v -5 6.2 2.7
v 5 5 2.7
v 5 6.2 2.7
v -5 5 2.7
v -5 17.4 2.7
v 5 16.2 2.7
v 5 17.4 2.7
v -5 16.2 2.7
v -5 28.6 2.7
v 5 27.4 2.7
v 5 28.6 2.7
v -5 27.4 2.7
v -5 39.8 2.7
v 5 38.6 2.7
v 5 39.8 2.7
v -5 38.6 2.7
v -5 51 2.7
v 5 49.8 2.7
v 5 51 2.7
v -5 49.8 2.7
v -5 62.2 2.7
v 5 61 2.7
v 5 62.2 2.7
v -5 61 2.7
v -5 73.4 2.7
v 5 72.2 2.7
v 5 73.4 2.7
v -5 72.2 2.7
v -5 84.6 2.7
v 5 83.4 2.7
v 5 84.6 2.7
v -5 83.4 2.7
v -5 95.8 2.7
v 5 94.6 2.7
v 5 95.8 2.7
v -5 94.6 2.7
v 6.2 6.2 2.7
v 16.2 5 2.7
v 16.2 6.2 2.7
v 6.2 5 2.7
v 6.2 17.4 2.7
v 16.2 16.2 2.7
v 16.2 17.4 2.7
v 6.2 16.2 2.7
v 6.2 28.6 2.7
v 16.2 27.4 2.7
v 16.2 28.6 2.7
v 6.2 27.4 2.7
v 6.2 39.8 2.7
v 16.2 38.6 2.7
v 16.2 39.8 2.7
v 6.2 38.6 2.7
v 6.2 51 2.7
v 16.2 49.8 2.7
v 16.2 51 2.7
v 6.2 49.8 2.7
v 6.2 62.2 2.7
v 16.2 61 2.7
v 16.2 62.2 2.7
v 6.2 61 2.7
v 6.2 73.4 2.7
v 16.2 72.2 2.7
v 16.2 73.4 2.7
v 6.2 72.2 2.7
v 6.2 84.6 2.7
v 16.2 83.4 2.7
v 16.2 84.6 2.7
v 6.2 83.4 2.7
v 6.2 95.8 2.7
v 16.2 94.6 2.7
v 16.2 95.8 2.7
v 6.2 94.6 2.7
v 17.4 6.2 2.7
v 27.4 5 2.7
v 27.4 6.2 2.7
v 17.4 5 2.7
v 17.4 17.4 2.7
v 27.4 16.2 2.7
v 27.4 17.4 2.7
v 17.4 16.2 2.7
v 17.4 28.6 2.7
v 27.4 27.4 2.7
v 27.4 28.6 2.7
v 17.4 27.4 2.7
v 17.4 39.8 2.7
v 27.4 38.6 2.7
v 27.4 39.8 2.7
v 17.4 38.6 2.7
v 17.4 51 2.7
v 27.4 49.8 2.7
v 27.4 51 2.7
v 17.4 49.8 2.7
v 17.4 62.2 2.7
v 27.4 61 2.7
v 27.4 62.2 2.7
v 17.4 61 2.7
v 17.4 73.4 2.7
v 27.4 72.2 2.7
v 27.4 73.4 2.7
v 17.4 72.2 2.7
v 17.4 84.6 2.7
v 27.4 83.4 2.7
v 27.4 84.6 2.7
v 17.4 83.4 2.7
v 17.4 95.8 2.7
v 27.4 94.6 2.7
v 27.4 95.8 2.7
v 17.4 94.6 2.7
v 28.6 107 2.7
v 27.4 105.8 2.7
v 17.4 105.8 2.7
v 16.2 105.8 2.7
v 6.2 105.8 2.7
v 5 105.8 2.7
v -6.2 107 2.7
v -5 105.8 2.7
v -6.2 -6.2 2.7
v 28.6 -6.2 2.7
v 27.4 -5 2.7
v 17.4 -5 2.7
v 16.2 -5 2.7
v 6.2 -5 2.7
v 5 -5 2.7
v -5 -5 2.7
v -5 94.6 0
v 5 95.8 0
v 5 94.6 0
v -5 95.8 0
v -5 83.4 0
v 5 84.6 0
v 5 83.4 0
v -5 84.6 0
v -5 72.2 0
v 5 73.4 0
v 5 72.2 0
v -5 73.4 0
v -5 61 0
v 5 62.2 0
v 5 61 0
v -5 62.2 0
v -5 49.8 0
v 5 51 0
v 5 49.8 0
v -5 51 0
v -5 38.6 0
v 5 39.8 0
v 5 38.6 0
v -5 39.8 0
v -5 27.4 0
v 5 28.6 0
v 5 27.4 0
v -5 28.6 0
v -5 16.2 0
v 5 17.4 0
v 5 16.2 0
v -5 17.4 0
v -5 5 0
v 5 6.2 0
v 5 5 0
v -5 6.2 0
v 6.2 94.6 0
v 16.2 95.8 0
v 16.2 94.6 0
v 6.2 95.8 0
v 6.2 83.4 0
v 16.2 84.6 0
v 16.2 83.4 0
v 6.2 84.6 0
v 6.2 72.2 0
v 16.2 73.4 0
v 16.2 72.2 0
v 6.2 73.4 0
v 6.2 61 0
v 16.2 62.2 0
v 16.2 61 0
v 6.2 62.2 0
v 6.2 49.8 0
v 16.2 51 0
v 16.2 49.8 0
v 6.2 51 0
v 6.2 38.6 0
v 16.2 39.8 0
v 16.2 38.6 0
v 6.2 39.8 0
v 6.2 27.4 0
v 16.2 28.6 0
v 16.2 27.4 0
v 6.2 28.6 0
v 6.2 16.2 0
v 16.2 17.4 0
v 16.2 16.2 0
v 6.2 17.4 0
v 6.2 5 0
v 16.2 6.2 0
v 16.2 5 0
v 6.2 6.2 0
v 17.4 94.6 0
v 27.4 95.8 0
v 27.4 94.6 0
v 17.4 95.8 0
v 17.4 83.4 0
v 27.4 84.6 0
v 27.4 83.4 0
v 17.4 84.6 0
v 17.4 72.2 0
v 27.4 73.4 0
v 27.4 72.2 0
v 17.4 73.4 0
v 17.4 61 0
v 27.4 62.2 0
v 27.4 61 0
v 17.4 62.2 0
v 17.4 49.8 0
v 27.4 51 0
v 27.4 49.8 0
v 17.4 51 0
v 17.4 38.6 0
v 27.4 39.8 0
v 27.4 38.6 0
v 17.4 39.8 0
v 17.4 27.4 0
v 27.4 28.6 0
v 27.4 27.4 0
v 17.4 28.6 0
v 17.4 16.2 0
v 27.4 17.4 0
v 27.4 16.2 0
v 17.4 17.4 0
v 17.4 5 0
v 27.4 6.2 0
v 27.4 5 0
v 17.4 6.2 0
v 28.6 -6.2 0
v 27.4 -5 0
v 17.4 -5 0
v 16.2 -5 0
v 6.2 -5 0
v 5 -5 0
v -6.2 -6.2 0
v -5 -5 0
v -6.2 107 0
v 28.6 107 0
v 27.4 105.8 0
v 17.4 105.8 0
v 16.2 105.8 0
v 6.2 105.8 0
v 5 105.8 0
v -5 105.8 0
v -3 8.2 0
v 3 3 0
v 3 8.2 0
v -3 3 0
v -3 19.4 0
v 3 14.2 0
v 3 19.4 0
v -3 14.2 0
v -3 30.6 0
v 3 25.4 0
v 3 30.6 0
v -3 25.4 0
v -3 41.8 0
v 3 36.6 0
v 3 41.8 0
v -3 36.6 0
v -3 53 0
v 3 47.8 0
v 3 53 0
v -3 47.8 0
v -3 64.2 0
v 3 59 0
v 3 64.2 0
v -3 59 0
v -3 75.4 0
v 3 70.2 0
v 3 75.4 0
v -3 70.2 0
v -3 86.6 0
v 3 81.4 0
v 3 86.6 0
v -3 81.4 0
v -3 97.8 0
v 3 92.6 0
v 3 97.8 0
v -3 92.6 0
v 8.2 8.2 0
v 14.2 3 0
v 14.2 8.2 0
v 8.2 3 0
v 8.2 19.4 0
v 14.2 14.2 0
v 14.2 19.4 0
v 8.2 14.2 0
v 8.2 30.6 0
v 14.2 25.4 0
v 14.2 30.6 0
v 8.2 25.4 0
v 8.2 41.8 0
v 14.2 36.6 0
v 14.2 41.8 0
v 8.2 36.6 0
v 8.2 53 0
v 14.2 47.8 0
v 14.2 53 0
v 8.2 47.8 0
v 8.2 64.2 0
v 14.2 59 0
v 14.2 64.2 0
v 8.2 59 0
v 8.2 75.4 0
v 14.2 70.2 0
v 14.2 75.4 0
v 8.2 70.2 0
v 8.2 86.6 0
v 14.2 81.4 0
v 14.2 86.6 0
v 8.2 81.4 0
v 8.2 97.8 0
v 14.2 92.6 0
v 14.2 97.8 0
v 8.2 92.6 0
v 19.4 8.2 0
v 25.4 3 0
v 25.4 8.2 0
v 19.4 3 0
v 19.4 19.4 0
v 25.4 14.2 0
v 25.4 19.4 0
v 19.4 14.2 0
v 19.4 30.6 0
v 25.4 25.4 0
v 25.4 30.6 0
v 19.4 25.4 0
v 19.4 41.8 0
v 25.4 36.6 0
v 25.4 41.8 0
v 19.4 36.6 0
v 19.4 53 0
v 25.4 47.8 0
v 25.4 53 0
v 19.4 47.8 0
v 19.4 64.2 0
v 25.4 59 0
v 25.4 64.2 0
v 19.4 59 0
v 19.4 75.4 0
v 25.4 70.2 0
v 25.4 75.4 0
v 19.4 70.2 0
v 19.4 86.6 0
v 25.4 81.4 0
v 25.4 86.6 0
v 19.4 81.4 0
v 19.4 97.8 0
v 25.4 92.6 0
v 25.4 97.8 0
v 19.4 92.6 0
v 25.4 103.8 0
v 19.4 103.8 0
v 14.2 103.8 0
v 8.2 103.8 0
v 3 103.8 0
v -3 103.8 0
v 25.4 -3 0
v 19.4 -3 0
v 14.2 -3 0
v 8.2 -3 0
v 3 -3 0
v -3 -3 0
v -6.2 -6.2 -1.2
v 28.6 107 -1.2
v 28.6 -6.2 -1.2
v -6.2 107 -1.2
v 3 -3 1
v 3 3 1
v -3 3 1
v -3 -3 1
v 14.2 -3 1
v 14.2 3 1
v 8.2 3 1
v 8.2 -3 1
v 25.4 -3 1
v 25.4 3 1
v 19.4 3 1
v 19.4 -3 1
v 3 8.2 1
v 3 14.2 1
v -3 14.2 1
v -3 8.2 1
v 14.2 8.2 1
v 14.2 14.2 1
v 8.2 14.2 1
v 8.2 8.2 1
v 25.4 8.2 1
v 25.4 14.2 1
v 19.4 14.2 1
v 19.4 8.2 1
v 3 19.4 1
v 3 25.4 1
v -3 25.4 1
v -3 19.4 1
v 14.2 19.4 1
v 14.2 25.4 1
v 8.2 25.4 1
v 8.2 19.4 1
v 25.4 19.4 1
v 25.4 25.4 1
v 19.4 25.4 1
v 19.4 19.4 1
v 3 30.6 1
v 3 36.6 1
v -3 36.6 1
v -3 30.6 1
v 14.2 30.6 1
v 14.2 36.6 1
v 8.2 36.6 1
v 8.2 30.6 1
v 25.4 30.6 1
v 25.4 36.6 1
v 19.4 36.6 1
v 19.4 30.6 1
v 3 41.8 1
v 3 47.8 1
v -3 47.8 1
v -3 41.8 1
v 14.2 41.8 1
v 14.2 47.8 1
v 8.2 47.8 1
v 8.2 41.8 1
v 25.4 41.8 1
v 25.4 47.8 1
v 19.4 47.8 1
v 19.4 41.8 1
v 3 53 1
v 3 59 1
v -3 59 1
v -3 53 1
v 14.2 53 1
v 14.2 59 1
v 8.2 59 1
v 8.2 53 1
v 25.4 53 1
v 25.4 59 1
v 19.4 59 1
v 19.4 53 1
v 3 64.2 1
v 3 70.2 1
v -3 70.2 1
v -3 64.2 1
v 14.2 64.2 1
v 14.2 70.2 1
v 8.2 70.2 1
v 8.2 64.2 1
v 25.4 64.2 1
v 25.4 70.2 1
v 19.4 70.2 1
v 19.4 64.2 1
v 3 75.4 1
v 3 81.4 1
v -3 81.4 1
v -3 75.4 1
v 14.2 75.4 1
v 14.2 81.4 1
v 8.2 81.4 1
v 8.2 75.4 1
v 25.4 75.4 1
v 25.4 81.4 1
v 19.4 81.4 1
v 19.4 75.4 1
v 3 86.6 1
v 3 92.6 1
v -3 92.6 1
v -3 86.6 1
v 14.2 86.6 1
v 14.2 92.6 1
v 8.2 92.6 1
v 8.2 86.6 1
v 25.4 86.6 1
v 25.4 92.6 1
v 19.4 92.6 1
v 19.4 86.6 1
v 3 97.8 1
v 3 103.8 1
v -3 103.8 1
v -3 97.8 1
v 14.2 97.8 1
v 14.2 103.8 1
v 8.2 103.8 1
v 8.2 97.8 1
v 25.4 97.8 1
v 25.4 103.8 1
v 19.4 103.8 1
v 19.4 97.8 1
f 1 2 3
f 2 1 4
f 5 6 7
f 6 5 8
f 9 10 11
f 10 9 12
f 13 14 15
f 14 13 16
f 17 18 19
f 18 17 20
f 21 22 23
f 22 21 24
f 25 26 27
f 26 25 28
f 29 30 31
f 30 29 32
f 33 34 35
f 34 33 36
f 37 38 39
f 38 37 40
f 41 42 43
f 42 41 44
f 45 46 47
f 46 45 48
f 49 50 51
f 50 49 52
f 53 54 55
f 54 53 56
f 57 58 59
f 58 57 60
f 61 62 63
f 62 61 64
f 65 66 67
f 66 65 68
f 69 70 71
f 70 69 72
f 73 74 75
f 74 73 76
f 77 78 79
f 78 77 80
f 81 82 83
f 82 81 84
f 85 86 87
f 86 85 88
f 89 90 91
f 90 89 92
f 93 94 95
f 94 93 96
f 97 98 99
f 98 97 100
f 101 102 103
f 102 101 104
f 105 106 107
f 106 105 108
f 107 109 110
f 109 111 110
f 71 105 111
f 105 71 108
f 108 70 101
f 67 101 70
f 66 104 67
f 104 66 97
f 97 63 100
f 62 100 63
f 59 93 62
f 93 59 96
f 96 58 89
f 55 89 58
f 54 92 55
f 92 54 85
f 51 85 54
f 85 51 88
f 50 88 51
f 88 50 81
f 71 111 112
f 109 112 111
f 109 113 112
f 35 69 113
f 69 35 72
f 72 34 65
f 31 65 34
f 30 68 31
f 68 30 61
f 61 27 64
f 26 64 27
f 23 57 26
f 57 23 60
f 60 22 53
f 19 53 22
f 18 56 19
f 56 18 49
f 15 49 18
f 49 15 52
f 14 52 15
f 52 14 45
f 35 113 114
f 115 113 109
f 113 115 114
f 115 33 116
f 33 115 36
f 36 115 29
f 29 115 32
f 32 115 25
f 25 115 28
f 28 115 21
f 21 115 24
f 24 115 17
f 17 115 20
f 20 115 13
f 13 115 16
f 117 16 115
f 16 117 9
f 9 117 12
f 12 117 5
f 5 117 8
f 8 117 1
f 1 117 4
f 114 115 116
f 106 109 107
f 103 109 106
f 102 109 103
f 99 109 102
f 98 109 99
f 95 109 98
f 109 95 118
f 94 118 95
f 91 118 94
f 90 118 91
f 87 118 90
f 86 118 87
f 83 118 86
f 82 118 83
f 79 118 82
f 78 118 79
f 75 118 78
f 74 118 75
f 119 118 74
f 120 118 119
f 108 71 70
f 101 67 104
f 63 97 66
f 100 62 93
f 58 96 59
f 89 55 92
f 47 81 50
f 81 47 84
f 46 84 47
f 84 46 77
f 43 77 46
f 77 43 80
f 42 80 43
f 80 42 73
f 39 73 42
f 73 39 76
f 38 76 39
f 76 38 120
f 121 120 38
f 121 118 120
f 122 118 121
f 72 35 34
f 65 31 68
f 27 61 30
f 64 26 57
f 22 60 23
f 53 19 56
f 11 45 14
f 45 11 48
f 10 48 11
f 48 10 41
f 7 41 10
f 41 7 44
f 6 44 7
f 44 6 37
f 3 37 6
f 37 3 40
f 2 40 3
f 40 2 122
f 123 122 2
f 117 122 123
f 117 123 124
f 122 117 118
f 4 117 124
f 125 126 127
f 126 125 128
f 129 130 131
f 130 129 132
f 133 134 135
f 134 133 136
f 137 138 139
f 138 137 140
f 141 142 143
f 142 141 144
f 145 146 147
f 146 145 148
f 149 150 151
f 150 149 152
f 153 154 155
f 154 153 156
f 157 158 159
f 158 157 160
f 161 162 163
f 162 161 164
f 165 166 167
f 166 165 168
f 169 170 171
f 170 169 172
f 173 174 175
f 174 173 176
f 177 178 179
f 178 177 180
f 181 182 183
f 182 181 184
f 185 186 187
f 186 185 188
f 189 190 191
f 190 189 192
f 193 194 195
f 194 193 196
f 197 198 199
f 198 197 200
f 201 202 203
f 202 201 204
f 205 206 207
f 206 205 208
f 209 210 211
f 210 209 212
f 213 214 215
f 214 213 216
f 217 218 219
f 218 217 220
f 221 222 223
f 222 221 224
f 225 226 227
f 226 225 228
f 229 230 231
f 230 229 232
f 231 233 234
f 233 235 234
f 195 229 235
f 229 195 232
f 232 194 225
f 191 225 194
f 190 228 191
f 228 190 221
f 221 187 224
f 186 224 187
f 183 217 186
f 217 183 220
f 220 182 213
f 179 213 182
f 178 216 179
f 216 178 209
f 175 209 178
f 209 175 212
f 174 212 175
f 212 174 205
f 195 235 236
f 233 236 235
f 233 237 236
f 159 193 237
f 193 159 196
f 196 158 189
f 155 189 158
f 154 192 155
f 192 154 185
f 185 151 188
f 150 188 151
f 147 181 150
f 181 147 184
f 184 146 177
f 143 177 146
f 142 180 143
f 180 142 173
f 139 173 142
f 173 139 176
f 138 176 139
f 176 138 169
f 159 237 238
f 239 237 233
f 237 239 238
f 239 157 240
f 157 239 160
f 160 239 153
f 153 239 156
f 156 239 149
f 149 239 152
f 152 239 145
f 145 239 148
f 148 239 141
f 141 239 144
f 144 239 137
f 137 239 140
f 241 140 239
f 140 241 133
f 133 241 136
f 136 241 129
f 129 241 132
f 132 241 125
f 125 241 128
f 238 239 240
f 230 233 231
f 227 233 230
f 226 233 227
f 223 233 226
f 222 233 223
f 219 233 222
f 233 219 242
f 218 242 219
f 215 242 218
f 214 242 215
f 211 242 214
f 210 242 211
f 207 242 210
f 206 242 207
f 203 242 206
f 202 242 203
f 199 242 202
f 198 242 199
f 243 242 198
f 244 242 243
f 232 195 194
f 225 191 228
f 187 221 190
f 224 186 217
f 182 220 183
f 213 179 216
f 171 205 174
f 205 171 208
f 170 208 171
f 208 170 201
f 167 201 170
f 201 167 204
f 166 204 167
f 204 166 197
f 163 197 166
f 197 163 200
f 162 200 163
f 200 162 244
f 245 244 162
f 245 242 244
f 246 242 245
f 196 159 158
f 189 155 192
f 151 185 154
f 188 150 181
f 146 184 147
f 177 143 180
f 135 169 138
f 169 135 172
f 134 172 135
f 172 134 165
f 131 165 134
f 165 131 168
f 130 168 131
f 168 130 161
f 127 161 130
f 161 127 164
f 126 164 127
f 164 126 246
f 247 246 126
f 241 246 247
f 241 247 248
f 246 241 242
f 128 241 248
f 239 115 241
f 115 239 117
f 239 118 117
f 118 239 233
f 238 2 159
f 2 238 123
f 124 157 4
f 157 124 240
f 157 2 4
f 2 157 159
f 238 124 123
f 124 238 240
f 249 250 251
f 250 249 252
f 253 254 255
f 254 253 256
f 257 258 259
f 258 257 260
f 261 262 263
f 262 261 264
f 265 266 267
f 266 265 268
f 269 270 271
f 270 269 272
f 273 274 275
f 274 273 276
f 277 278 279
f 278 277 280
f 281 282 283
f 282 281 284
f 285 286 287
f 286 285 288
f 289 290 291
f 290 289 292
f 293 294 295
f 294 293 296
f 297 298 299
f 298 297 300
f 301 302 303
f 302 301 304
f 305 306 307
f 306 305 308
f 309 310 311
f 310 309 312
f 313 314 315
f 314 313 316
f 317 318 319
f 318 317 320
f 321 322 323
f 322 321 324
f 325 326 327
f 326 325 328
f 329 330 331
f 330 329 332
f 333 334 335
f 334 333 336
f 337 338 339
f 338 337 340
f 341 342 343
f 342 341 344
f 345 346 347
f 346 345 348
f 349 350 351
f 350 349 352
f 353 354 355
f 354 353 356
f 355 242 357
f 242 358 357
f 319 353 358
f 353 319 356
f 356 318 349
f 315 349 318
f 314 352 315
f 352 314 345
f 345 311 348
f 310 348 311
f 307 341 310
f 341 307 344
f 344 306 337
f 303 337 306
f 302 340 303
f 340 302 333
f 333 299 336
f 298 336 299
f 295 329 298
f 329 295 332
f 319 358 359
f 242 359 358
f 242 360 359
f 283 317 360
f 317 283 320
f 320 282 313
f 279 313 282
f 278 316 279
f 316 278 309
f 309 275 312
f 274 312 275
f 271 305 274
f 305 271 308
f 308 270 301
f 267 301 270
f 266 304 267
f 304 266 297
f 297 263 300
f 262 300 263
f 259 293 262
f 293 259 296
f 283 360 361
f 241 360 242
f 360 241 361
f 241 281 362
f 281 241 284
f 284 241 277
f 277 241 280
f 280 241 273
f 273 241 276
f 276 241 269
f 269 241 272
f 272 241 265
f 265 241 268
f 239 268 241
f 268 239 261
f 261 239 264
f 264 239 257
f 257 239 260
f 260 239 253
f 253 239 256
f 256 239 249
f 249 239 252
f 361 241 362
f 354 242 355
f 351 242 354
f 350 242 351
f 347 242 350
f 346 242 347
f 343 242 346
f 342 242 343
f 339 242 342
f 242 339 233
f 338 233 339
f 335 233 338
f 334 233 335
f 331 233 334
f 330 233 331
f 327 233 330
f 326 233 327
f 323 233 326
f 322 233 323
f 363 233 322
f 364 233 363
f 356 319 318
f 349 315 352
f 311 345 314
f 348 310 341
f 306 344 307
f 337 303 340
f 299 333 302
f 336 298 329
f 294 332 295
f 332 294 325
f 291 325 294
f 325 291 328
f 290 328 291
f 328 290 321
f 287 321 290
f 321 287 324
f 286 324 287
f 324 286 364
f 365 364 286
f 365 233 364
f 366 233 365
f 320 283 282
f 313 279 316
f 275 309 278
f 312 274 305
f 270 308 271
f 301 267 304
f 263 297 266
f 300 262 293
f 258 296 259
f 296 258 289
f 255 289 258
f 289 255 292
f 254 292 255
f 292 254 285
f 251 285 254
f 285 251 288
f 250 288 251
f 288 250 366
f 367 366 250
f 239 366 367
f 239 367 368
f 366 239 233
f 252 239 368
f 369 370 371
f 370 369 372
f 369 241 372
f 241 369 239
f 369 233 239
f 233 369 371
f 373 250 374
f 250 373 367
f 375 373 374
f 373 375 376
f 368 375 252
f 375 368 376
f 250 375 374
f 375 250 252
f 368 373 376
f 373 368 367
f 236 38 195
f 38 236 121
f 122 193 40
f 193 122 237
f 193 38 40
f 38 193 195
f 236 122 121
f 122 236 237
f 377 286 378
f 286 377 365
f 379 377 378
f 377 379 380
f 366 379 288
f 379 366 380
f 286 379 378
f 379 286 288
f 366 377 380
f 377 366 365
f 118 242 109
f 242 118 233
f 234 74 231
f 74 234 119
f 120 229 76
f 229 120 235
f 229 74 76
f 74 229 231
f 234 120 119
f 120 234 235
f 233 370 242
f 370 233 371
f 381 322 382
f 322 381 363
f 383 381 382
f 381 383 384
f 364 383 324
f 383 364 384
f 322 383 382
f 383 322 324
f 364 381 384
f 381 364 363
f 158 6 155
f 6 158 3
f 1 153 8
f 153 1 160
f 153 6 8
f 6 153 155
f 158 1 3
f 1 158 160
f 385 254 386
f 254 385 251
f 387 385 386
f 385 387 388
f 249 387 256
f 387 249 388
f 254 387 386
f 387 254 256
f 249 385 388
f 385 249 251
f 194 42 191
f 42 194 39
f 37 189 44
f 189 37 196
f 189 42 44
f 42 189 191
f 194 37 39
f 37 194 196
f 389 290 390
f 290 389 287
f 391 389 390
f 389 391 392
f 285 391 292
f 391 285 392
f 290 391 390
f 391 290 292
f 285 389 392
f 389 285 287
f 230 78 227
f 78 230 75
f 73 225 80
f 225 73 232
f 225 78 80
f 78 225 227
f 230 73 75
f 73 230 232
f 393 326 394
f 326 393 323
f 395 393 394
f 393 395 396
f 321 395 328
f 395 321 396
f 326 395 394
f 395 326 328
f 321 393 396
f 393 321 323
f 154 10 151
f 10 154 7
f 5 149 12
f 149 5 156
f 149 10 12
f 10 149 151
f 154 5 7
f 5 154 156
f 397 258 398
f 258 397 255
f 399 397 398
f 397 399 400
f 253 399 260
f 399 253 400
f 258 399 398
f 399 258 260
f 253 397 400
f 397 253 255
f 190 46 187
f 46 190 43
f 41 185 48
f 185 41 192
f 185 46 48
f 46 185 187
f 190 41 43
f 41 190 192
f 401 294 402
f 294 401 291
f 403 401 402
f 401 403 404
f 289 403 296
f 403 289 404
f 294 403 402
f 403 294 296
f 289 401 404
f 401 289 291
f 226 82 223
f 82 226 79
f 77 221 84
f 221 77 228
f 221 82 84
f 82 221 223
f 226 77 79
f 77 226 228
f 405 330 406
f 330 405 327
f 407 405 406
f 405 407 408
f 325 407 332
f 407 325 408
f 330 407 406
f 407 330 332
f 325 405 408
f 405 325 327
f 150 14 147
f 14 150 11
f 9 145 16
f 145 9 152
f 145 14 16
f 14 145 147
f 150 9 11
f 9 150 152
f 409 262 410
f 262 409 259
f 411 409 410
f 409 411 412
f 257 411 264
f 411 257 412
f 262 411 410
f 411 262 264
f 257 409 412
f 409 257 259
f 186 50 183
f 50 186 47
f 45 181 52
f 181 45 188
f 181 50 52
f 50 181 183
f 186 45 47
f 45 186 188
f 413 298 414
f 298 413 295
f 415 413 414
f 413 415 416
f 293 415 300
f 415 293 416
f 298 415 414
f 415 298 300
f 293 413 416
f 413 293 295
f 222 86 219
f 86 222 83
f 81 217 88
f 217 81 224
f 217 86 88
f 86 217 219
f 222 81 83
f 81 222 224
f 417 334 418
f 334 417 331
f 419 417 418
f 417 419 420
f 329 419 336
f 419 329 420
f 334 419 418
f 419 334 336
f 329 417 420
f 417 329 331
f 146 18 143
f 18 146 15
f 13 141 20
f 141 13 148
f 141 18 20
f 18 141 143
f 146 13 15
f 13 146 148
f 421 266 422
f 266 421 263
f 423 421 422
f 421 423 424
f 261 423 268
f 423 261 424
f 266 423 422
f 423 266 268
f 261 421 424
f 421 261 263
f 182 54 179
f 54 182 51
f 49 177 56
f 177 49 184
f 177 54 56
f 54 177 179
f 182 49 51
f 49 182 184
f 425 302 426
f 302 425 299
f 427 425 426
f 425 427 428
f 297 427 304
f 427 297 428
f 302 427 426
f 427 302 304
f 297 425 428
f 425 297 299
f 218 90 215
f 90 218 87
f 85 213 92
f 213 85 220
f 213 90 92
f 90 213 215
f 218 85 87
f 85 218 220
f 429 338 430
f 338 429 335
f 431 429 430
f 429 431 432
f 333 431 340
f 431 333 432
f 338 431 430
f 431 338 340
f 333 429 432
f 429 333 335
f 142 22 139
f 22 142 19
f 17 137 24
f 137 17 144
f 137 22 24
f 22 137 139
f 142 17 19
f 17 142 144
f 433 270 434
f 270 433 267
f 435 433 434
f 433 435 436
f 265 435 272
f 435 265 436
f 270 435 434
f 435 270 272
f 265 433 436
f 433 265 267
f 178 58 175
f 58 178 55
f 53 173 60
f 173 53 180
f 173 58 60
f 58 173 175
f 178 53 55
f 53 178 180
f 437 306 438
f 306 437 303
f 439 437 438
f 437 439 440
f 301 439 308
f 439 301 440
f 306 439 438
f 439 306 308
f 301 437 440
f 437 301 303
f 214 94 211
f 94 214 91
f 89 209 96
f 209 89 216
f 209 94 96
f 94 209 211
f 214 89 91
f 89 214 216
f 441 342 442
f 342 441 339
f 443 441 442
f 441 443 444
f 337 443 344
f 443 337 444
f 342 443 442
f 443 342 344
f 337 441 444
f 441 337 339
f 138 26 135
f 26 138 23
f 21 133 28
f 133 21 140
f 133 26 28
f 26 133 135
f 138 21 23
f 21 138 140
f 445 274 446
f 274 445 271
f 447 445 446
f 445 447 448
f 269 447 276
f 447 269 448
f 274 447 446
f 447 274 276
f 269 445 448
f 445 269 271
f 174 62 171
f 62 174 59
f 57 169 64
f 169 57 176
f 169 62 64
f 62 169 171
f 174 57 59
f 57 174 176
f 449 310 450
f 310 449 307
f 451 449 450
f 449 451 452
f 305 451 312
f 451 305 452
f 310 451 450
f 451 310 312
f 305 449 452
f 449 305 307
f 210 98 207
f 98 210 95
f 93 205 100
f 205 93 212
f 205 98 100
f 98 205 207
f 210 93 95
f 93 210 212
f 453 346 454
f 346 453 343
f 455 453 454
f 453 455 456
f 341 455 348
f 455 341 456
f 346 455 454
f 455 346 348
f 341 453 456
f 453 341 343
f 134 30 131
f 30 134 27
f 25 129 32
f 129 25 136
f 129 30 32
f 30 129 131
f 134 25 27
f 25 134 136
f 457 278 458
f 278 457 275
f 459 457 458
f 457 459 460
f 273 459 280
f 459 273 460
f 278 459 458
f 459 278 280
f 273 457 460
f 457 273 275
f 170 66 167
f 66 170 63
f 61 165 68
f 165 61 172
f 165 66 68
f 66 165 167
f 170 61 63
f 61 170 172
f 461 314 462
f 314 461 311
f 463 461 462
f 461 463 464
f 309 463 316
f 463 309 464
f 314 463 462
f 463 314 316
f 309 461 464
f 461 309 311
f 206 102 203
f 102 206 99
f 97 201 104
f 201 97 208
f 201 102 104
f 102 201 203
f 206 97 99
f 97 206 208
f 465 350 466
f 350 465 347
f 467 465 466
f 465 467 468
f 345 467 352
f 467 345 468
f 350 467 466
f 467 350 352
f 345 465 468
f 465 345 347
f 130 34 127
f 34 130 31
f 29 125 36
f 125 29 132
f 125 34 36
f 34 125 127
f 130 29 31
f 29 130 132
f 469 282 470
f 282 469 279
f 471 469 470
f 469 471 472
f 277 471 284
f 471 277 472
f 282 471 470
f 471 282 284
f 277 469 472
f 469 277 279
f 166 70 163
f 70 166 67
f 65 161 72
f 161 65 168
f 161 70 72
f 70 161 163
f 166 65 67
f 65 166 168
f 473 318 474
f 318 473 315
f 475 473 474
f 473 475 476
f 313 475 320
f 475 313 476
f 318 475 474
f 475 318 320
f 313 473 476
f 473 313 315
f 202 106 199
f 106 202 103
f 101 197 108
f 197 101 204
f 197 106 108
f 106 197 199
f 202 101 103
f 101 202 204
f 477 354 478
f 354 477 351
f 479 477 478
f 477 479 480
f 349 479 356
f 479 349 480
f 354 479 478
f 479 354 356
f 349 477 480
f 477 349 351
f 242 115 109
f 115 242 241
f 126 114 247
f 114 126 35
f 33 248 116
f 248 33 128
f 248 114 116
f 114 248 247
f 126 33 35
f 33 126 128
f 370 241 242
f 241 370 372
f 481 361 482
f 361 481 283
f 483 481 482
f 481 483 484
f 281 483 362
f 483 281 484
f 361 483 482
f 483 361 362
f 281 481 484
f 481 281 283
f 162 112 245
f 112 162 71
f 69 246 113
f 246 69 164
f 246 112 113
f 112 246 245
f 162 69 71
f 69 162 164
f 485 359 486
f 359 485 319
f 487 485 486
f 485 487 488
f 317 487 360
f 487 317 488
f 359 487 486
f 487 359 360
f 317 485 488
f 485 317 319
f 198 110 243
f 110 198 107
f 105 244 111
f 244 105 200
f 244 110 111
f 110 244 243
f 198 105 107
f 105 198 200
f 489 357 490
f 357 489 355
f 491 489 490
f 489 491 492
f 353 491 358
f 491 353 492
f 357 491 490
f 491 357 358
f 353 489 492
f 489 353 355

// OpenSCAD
/*
Parametric holder for QFP chips to protect the pins in transport
*/

//X size of individual chip leg end to end
SizeX = 9; 		//[3:100]
//Y size of individual chip leg end to end
SizeY = 9; 		//[3:100]
//Z height of individual chip
SizeZ = 1.2; 	//[0.2:0.1:20]
//Length of legs from package
LengthLeg = 1;	//[0.4:0.1:3]
//Foot height under plastik package to make the legs not touch the ground
HeightFoot = 1;	//[0:0.1:10]
//Tolerance distance for basically everything
Tolerance = 0.5;//[0:0.1:3]
//Number of horizontal chips
NumHor = 3;		//[1:100]
//Number of vertical chips
NumVer = 10;		//[1:100]
//Wall thiccness
SizeWall = 1.2;	//[0.4:0.1:3]

//Fixed Resolution
$fa=5+0;
$fs=0.5+0;

//Actual code rendering and translating the individual holders for the number of set holders
for(j = [0 : NumVer-1]){
	for(i = [0 : NumHor-1]){
		translate([(SizeX+SizeWall+Tolerance*2)*i, (SizeY+SizeWall+Tolerance*2)*j, 0]) holder();
	}
}


//Modules
module holder() {
	//ground plate from 0 down
	translate([0,0,-SizeWall/2])
		cube([(SizeX+SizeWall*2+Tolerance*2) , (SizeY+SizeWall*2+Tolerance*2) , SizeWall], true);
	
	//foot from 0 up
	translate([0,0,HeightFoot/2])
		cube([(SizeX-LengthLeg*2-Tolerance*2) , (SizeX-LengthLeg*2-Tolerance*2) , (HeightFoot)] , true);
	
	//Walls from 0 up
	translate ([0,0,(SizeZ++HeightFoot+Tolerance)/2])
		difference() {
				cube([(SizeX+SizeWall*2+Tolerance*2) , (SizeY+SizeWall*2+Tolerance*2) , (SizeZ+HeightFoot+Tolerance)], true);
				cube([(SizeX+Tolerance*2) , (SizeY+Tolerance*2) , (SizeZ+HeightFoot+Tolerance+1)], true);
		}
}
